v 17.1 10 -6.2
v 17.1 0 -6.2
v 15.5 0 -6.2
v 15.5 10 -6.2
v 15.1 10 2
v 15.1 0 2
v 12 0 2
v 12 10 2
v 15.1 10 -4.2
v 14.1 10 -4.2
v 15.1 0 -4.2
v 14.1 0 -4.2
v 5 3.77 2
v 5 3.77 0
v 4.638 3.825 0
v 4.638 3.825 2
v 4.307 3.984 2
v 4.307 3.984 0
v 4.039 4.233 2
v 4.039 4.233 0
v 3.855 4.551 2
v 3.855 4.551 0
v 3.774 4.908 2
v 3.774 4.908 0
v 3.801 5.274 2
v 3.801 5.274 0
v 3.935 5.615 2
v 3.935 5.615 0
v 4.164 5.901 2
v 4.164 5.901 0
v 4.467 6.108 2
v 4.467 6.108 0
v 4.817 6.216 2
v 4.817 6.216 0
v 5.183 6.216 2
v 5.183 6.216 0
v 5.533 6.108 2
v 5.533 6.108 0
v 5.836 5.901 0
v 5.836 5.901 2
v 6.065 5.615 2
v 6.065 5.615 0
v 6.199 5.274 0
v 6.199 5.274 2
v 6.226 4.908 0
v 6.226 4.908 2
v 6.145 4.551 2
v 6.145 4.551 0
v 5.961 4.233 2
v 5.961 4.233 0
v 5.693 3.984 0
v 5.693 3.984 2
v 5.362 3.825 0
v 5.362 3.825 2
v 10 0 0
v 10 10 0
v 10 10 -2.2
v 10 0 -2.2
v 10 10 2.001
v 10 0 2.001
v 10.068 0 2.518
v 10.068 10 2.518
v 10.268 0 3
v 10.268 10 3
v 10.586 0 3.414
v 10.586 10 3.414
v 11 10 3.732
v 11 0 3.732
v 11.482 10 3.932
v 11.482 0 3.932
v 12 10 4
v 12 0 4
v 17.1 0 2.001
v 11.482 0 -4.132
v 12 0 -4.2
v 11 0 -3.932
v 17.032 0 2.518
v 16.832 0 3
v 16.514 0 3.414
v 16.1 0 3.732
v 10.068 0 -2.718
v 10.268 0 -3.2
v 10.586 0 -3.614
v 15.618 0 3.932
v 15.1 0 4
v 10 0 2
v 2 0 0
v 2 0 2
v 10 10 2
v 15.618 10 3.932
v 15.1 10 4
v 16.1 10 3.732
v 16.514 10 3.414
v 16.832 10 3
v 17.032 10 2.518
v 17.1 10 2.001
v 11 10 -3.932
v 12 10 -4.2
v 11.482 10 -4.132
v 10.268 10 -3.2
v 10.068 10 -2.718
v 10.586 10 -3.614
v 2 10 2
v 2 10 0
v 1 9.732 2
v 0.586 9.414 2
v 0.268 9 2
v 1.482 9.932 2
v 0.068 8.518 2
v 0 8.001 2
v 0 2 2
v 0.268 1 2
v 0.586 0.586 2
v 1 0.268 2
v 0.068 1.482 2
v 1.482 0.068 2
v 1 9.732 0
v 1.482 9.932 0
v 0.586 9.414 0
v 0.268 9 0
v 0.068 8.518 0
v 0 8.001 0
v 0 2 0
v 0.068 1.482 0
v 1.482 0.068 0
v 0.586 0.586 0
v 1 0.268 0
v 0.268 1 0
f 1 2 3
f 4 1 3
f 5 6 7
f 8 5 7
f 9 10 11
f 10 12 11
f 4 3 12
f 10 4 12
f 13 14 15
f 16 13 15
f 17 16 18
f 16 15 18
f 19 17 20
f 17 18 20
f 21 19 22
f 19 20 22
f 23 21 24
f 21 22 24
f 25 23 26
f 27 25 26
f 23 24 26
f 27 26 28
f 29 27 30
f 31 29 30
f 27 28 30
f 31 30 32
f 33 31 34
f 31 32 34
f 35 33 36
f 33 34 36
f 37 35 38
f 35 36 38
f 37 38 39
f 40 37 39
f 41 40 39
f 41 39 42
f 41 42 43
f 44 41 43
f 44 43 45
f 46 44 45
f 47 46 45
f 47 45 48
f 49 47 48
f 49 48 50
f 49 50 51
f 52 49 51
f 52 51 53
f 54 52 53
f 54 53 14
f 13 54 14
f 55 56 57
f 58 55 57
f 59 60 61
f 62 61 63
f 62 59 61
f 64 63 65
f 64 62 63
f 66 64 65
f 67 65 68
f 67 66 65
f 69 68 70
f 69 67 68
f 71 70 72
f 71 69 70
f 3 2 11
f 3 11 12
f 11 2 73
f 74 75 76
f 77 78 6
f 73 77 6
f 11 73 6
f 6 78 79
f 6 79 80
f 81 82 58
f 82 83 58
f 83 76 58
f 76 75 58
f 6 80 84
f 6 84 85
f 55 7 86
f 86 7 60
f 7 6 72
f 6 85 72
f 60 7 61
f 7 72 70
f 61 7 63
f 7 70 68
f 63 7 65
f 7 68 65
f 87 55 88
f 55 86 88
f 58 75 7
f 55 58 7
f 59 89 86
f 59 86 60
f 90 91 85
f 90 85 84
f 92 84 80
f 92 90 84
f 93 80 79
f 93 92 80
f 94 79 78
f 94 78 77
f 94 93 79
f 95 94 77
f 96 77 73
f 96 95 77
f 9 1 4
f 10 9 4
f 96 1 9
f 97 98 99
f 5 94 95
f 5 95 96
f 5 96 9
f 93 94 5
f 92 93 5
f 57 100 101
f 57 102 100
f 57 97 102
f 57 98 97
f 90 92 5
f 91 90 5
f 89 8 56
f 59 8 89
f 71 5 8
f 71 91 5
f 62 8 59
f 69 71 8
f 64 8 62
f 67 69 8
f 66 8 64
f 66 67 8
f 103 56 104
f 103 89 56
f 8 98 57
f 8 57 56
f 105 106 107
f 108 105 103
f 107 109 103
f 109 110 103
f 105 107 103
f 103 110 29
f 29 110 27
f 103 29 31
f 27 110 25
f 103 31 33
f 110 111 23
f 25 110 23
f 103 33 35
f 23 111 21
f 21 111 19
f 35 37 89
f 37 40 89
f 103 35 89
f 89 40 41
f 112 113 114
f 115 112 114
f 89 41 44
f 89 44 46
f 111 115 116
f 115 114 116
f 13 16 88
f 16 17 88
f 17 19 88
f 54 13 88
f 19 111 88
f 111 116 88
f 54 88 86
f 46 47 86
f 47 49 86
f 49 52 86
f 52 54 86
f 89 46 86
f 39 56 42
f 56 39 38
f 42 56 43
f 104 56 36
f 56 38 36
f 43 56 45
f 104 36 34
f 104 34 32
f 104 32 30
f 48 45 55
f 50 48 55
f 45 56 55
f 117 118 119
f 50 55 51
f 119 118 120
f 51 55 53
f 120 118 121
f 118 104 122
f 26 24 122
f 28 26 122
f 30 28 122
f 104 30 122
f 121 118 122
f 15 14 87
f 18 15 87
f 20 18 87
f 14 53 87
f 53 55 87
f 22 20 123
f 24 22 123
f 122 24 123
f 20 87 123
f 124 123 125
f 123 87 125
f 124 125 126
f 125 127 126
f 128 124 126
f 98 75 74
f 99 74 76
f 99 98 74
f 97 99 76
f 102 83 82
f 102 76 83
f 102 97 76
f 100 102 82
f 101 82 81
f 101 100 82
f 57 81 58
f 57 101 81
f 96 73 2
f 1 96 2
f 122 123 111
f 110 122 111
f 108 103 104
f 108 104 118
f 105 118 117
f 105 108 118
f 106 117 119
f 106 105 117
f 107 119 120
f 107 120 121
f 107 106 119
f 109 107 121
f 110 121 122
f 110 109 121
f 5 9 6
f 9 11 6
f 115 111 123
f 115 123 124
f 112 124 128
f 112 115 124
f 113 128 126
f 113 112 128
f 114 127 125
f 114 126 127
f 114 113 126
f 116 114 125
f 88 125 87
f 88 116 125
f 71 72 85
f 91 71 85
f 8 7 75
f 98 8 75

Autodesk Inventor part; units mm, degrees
ref_plane "YZ Plane" through (0, 0, 0) normal (1, 0, 0) x (0, 1, 0)
ref_plane "XZ Plane" through (0, 0, 0) normal (0, 1, 0) x (-1, 0, 0)
ref_plane "XY Plane" through (0, 0, 0) normal (0, 0, 1) x (1, 0, 0)
sketch "Esboço1" plane through (0, 0, 0) normal (0, 1, 0) x (-1, 0, 0)
  line L0 (0, 0) -> (0, 2)
  line L1 (0, 2) -> (-10, 2)
  line L2 (-10, 2) -> (-10, 4)
  line L3 (-10, 4) -> (-17.1, 4)
  line L4 (-17.1, 4) -> (-17.1, -6.2)
  line L5 (-17.1, -6.2) -> (-15.5004, -6.2)
  line L6 (-15.5004, -6.2) -> (-14.1, -4.2)
  line L7 (-14.1, -4.2) -> (-15.1, -4.2)
  line L8 (-15.1, -4.2) -> (-15.1, 2)
  line L9 (-15.1, 2) -> (-12, 2)
  line L10 (-12, 2) -> (-12, 0)
  line L11 (-12, 0) -> (0, 0)
  line L12 (-12, 0) -> (-11.1591, 0) construction
  line L13 (-10, 0) -> (-10, -4.2)
  line L14 (-10, -4.2) -> (-12, -4.2)
  line L15 (-12, -4.2) -> (-12, 0)
  line L16 (-11.1591, 0) -> (-10, 0) construction
  dimension "d0" = 2
  dimension "d1" = 55
  dimension "d2" = 10
  dimension "d3" = 6.2
  dimension "d4" = 2
  dimension "d5" = 2
  dimension "d6" = 2
  dimension "d7" = 3.1
  dimension "d8" = 1
  dimension "d10" = 2
  dimension "d11" = 2
  dimension "d12" = 12
  dimension "d25" = 2
extrude "Extrusão1" add sketch "Esboço1" along normal blind 10
sketch "Esboço2" plane through (0, 0, 2) normal (0, 0, 1) x (1, 0, 0)
  line L0 (0, 0) -> (0, 10) projected
  line L1 (0, 0) -> (10, 0) projected
  point P0 (5, 5)
  dimension "d15" = 5
  dimension "d16" = 5
hole "Furo1" at (5, 5, 2) direction (0, 0, -1) diameter 2.459 end through all thread size "M3x0.5" class "6H" standard "ISO Metric profile"
fillet "Arredondamento1" radius 2 5 edges at (17.1, 5, 4) (10, 5, 4) (0, 10, 1) (0, 0, 1) (10, 5, -4.2)
properties part number "cantoneira"
